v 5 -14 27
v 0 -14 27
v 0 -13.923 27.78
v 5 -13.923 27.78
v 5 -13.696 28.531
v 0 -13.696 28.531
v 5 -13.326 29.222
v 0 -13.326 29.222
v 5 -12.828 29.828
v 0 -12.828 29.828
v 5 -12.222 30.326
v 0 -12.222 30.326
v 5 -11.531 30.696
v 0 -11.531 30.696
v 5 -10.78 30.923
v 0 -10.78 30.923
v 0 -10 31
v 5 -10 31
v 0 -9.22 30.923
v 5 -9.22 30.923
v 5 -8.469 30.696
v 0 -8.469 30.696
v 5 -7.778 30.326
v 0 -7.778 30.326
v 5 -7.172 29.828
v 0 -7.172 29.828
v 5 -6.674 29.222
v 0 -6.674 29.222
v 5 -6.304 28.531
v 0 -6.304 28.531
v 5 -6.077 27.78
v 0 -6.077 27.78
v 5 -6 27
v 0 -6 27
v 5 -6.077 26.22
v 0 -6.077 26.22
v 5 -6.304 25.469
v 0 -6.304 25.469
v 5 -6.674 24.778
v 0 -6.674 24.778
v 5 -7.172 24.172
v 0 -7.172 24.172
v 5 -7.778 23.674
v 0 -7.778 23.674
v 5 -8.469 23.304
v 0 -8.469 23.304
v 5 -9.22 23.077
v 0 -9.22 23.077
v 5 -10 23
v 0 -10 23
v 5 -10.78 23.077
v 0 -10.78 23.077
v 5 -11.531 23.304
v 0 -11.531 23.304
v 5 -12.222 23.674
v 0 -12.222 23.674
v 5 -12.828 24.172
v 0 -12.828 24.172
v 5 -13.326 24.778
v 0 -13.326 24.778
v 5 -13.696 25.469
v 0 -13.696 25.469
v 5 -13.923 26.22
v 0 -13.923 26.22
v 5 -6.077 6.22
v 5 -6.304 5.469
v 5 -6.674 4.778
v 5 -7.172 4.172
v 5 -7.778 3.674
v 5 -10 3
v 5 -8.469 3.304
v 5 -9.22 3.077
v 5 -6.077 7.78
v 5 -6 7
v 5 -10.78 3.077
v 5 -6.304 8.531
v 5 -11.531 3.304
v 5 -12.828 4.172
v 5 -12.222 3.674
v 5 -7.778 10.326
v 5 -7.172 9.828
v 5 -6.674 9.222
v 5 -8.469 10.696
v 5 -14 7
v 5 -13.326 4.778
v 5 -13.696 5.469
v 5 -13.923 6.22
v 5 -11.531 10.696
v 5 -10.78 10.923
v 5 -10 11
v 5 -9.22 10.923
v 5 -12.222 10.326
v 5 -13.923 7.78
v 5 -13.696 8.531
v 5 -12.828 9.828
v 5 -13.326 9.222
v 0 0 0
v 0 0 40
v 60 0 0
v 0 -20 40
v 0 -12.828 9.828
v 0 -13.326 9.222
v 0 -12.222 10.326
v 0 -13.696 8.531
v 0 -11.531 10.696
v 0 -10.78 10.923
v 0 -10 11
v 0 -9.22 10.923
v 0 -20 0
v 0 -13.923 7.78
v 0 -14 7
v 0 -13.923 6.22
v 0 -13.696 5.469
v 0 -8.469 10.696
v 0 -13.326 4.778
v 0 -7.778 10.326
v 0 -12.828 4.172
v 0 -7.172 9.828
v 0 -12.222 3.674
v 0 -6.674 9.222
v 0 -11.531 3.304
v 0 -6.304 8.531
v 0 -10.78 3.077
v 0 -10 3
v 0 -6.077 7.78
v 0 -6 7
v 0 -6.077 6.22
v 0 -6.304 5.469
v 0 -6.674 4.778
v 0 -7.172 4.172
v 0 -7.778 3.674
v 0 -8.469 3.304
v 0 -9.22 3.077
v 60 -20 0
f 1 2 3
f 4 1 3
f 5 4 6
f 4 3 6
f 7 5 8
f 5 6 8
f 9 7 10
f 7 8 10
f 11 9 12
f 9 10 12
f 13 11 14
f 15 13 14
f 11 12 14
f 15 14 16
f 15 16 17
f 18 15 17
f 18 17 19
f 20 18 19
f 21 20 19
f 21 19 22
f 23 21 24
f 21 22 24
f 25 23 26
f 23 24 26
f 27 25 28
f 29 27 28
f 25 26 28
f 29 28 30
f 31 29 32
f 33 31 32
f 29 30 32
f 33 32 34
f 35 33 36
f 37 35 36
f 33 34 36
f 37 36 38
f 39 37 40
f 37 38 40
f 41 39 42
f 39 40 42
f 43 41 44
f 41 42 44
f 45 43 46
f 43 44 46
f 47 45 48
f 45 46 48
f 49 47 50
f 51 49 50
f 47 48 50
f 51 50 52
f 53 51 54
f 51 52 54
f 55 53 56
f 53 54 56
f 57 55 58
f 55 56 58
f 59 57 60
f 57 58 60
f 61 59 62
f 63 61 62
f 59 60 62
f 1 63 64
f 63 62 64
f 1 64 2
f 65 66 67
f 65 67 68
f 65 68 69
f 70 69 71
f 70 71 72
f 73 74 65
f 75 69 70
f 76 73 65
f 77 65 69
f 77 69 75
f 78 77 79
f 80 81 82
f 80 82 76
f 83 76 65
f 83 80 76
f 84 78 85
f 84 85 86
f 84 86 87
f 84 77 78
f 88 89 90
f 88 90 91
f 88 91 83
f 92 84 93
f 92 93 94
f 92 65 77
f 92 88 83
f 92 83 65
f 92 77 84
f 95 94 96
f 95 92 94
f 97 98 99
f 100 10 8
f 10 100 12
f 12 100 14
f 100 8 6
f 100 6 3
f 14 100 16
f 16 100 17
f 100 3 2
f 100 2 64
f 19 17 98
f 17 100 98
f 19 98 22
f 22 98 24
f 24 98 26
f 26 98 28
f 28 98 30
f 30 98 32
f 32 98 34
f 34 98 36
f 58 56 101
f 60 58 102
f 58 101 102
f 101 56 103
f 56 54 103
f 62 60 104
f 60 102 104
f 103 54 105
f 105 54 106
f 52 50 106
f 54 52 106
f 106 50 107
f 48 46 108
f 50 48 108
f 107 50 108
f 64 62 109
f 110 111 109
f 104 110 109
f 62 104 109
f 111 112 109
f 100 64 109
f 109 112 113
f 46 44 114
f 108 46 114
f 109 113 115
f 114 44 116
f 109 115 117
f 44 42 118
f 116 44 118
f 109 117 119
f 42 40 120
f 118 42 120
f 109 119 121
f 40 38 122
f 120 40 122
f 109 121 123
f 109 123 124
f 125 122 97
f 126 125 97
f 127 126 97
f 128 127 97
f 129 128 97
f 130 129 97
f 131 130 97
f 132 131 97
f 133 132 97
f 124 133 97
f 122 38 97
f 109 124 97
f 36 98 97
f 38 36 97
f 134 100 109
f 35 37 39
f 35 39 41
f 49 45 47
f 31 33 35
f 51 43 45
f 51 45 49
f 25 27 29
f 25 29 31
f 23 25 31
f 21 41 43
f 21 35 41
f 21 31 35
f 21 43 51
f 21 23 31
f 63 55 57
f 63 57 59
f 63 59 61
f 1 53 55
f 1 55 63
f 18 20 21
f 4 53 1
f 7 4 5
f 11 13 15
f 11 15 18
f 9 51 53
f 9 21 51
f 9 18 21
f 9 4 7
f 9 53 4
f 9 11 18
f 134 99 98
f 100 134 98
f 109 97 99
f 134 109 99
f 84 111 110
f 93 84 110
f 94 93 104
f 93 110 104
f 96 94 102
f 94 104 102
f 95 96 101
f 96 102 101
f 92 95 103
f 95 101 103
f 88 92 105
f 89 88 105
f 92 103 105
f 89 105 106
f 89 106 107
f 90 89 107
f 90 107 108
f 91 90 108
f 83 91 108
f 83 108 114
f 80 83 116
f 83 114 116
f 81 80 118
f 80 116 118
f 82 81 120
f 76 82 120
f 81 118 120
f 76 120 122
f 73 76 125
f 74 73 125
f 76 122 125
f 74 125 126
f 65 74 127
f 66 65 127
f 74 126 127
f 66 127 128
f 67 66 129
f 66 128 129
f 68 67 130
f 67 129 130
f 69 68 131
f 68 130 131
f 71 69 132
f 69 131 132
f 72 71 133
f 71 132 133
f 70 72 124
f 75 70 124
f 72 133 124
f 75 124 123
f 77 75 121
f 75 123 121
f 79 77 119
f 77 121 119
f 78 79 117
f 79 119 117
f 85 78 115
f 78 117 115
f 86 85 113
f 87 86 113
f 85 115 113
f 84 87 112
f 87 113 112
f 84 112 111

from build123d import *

# Parameters (mm, degrees)
F1_DEPTH = 20
F2_R     = 4
F3_DEPTH = 5


with BuildPart() as f1:
    # F0 (on Front) → F1 (new body)
    with BuildSketch(Plane.XZ):
        Polygon((0, 40), (0, 0), (60, 0), align=None)
    extrude(amount=F1_DEPTH)

    # F2 (on face) → F3 (cut)
    with BuildSketch(Plane(origin=(0, 0, 0), x_dir=(0, -1, 0), z_dir=(-1, 0, 0))):
        with Locations((10, 7)):
            Circle(F2_R)
        with Locations((10, 27)):
            Circle(F2_R)
    extrude(amount=-F3_DEPTH, mode=Mode.SUBTRACT)


solid = f1.part
